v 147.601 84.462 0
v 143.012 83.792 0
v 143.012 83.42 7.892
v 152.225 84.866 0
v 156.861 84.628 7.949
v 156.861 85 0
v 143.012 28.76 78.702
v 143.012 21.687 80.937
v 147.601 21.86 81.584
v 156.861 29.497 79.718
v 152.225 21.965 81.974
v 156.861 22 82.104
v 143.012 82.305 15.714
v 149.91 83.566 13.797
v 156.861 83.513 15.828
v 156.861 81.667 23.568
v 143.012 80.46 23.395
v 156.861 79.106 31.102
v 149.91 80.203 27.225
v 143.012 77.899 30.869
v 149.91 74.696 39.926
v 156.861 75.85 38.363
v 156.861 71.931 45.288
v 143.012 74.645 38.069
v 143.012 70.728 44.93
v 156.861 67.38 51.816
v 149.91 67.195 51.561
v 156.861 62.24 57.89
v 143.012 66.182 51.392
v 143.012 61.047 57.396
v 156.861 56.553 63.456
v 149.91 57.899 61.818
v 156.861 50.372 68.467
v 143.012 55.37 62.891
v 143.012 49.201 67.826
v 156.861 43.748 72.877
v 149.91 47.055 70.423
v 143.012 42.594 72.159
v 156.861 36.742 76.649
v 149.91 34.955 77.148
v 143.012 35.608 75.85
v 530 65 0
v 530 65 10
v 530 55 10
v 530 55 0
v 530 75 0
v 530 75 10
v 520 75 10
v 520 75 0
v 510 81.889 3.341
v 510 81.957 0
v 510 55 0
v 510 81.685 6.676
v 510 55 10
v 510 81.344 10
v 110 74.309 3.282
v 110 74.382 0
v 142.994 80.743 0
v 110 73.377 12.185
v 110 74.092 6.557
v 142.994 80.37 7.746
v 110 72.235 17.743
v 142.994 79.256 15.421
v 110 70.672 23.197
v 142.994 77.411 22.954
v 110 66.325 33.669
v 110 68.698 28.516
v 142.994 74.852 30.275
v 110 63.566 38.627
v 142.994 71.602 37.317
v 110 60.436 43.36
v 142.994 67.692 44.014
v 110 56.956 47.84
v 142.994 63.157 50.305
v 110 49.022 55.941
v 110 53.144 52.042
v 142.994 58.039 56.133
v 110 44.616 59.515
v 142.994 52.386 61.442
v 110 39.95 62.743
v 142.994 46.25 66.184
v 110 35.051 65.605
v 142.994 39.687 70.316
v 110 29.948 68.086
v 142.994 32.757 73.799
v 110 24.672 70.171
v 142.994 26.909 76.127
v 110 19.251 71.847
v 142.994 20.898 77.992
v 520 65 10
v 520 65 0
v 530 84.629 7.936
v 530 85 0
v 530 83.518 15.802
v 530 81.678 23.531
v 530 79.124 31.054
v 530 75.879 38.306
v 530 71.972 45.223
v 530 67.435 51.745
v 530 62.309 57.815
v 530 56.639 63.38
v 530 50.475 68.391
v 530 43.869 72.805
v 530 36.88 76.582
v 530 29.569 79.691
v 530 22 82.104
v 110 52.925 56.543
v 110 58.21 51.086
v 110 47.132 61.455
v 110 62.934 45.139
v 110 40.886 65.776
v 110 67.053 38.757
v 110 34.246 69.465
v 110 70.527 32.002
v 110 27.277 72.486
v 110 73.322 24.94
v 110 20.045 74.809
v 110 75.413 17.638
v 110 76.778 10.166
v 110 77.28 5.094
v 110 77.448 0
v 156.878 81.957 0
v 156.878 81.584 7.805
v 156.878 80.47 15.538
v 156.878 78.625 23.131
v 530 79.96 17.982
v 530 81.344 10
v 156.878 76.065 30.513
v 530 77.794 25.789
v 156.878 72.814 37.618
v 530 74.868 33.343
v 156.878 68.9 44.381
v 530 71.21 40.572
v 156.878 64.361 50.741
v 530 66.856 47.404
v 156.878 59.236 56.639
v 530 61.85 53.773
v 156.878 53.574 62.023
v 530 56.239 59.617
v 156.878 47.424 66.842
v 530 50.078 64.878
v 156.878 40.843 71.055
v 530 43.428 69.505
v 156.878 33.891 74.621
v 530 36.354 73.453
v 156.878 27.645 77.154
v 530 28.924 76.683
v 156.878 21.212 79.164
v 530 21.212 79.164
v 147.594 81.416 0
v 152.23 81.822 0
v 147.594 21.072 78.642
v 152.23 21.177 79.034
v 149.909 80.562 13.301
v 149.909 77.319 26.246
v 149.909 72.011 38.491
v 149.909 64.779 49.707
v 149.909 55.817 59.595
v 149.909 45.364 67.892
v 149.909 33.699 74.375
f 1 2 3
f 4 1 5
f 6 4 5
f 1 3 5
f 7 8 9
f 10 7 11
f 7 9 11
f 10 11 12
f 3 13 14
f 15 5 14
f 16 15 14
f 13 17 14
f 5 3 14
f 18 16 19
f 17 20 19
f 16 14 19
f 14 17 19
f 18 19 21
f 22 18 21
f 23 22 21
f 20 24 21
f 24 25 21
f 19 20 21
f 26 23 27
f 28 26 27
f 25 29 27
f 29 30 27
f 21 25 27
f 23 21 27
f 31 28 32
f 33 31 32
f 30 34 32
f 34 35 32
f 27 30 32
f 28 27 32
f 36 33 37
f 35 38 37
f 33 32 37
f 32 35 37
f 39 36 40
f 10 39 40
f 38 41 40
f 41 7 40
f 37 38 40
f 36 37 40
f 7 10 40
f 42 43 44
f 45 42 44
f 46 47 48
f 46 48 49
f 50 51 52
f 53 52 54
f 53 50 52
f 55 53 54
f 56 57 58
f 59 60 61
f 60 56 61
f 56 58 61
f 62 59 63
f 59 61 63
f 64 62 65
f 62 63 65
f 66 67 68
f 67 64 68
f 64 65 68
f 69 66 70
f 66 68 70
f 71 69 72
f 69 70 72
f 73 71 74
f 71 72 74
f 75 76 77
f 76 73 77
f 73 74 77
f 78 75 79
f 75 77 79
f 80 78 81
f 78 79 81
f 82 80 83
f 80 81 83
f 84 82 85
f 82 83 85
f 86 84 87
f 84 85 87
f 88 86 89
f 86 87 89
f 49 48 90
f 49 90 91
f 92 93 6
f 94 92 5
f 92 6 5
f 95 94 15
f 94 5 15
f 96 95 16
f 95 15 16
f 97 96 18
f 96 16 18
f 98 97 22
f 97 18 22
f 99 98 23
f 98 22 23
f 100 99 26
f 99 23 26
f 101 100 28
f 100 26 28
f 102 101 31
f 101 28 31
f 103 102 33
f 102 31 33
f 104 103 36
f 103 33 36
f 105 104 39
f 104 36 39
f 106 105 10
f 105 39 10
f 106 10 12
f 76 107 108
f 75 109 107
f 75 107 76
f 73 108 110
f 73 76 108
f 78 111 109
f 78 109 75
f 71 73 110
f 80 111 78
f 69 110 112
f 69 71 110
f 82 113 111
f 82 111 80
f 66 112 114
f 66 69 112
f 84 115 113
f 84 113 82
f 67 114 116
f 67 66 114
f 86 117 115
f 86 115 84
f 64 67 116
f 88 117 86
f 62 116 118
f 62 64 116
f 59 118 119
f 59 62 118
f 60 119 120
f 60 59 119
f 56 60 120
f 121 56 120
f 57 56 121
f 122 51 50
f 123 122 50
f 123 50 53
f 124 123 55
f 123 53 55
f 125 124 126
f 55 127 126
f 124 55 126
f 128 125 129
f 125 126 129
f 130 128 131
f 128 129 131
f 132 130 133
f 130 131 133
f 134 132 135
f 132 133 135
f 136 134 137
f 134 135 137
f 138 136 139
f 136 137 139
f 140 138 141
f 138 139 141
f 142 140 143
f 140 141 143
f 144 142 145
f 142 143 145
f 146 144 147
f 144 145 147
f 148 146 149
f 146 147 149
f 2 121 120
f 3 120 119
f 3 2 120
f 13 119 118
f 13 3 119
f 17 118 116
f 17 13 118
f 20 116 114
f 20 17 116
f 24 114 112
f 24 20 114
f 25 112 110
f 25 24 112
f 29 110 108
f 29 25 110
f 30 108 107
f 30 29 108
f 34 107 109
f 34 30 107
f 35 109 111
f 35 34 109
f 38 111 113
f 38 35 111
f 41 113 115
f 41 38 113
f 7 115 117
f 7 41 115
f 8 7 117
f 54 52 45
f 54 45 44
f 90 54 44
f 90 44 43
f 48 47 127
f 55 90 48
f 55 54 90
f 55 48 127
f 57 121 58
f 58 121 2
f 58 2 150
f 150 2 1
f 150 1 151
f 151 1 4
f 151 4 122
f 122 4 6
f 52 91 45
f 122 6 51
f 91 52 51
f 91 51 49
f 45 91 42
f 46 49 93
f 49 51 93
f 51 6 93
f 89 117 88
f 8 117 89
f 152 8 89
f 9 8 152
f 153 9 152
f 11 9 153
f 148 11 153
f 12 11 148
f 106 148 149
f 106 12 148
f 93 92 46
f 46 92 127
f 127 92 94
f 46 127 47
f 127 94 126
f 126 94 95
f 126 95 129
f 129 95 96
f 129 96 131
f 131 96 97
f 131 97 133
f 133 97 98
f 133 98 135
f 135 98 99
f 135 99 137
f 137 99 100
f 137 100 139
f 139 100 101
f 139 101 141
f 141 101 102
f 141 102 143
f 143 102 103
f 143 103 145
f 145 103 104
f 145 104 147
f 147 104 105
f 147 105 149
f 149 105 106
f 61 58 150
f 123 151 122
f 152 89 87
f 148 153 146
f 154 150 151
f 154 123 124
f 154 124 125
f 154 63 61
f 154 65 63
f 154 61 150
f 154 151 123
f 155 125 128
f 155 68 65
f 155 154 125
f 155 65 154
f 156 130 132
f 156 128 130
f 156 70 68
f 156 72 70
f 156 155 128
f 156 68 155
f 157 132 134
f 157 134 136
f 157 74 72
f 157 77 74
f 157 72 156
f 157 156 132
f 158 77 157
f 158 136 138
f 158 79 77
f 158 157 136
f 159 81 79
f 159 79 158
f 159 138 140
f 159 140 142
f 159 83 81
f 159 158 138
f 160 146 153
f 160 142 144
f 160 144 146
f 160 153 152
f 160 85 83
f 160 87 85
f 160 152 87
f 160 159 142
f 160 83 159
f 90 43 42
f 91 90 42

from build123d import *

# Parameters (mm, degrees)
REVOLVE1_ANGLE      = 75
FILLET1_R           = 80
FILLET2_R           = 80
SKETCH3_W           = 220
SKETCH3_H           = 208.906104004
CUT_EXTRUDE3_DEPTH  = 159
BOSS_EXTRUDE1_START = -20
BOSS_EXTRUDE1_DEPTH = 20
SKETCH6_W           = 10
SKETCH6_H           = 10
CUT_EXTRUDE4_DEPTH  = 10


with BuildPart() as part:
    # Sketch1 → Revolve1 (revolve)
    with BuildSketch(Plane.XY):
        with BuildLine():
            Line((0, 0), (3.000014971, 0))
            Line((3.000014971, 0), (2.999985029, 0.009477573))
            add(Edge.make_bspline(
                [(2.999985029, 0.009477573), (2.993785153, 1.971956174), (2.98195041, 5.919056141), (3.145368661, 11.706950418), (3.673805689, 17.348455242), (4.826995442, 22.758009885), (6.767385374, 27.848912294), (10.462264152, 34.106073266), (16.932254921, 40.80886219), (26.377617743, 47.258644811), (36.67301066, 52.572311975), (47.441384771, 57.081049673), (62.17748954, 62.31037411), (81.042213455, 67.757539775), (104.018152235, 73.218909741), (126.982089983, 77.893970447), (142.347775171, 80.65244689), (149.958103424, 81.949720096), (150, 81.956859546)],
                knots=[0, 0, 0, 0, 0.03125, 0.0625, 0.09375, 0.125, 0.15625, 0.1875, 0.25, 0.3125, 0.375, 0.4375, 0.5, 0.625, 0.75, 0.875, 0.996633751, 0.997307001, 0.997307001, 0.997307001, 0.997307001], degree=3))
            Line((150, 81.956859546), (530, 81.956859546))
            Line((530, 81.956859546), (530, 85))
            Line((530, 85), (150, 85))
            add(Edge.make_bspline(
                [(0, 0), (-0.012294225, 3.891554312), (-0.027437579, 8.684958126), (0.361573767, 14.085722357), (0.576098453, 16.090496183), (0.782493435, 17.604822189), (0.986227589, 18.854298664), (1.188670863, 19.931536976), (1.390404268, 20.885679324), (1.591698837, 21.746529091), (1.792703864, 22.533746067), (1.993507167, 23.261083862), (2.253808552, 24.139979457), (2.580573656, 25.146175179), (2.983585386, 26.259501153), (3.385879093, 27.271261727), (3.787683439, 28.201566994), (4.189138614, 29.064817448), (4.590335615, 29.871726974), (5.05331092, 30.74778076), (5.583218589, 31.683457084), (6.185429632, 32.669732492), (6.787226927, 33.590624245), (7.451481511, 34.546094958), (8.182770444, 35.530963646), (8.985083876, 36.540013411), (9.850344603, 37.562485558), (10.782608842, 38.595746542), (11.785011743, 39.636928062), (12.851029789, 40.680352273), (13.983960321, 41.72463117), (15.186170623, 42.768194245), (16.387975322, 43.755294725), (17.654380903, 44.743506811), (18.987602276, 45.731471932), (20.389198856, 46.717890971), (21.790522044, 47.657861765), (23.257103599, 48.59836715), (24.790441056, 49.538186318), (26.391587757, 50.476245251), (28.05829275, 51.412163763), (29.791720393, 52.345056651), (31.59268286, 53.274185034), (33.459445798, 54.199628429), (35.392909821, 55.120726442), (37.459746918, 56.067201212), (39.59327023, 57.006562681), (41.860151348, 57.96659169), (44.193707143, 58.917521836), (46.660609333, 59.885320784), (49.260404933, 60.867669295), (51.99403381, 61.861671206), (54.860992187, 62.865616104), (57.794602823, 63.85555089), (60.861539281, 64.853573463), (64.06149587, 65.858380358), (67.461497598, 66.888166734), (70.995135905, 67.920234745), (74.662088876, 68.953918346), (78.462130407, 69.988575944), (82.462197069, 71.040436012), (86.662284614, 72.107100186), (91.062388571, 73.18640193), (95.662505252, 74.276388609), (100.462631288, 75.375305679), (105.462763855, 76.481579791), (110.662900527, 77.593803027), (116.063039296, 78.710717608), (121.663178505, 79.831201671), (127.529872228, 80.967142806), (133.663251007, 82.116215238), (140.063409966, 83.276352633), (145.198462089, 84.177415336), (148.333178957, 84.715838785), (149.39998937, 84.897876633), (149.733326587, 84.954653305), (149.933332963, 84.98866355), (150, 85)],
                knots=[0, 0, 0, 0, 0.061462209, 0.075705788, 0.085548437, 0.093321935, 0.099856333, 0.105553797, 0.110642995, 0.115267654, 0.119524592, 0.123482434, 0.127191759, 0.134010181, 0.140199136, 0.145901384, 0.151215493, 0.156212588, 0.160945789, 0.165455878, 0.171870938, 0.177937368, 0.183716425, 0.189254732, 0.196326298, 0.203099892, 0.209625632, 0.217492532, 0.225090541, 0.232464167, 0.24106462, 0.249438142, 0.257620809, 0.265641058, 0.274822876, 0.28384341, 0.292725747, 0.301488561, 0.311376345, 0.321146599, 0.330814589, 0.341584449, 0.352255608, 0.362840299, 0.374512001, 0.386101174, 0.398765505, 0.411352526, 0.425006218, 0.438588433, 0.453231339, 0.468927603, 0.484557057, 0.501237456, 0.517857889, 0.535527769, 0.554243231, 0.574001115, 0.593705628, 0.614453399, 0.636242373, 0.65907093, 0.682937829, 0.707842151, 0.733783254, 0.760760729, 0.78877436, 0.81782409, 0.847909993, 0.879032247, 0.912262482, 0.946527454, 0.981827786, 0.994656092, 0.99679374, 0.998931275, 1, 1, 1, 1], degree=3))
        make_face()
    revolve(axis=Axis((0, 0, 0), (1, 0, 0)), revolution_arc=REVOLVE1_ANGLE)

    # Fillet1
    fillet1_edges = [part.edges().sort_by_distance(p)[0] for p in [
        (150, 65.020748281, 49.892174934),
    ]]
    fillet(fillet1_edges, radius=FILLET1_R)

    # Fillet2
    fillet2_edges = [part.edges().sort_by_distance(p)[0] for p in [
        (150, 67.435033925, 51.744721466),
    ]]
    fillet(fillet2_edges, radius=FILLET2_R)

    # Sketch3 → Cut-Extrude3 (cut)
    with BuildSketch(Plane(origin=(0, 0, 0), x_dir=(1, 0, 0), z_dir=(0, 1, 0))):
        Rectangle(SKETCH3_W, SKETCH3_H)
    extrude(amount=CUT_EXTRUDE3_DEPTH, mode=Mode.SUBTRACT)

    # Sketch5 → Boss-Extrude1 (add)
    with BuildSketch(Plane(origin=(530, 0, 0), x_dir=(0, 0, -1), z_dir=(1, 0, 0)).offset(BOSS_EXTRUDE1_START)):
        with BuildLine():
            Line((0, 85), (0, 55))
            Line((0, 55), (-10, 55))
            Line((-10, 55), (-10, 84.409715081))
            ThreePointArc((-10, 84.409715081), (-5.008703332, 84.852300446), (0, 85))
        make_face()
    extrude(amount=BOSS_EXTRUDE1_DEPTH)

    # Sketch6 → Cut-Extrude4 (cut)
    with BuildSketch(Plane(origin=(530, 0, 0), x_dir=(0, 0, -1), z_dir=(1, 0, 0))):
        with Locations((-5, 70)):
            Rectangle(SKETCH6_W, SKETCH6_H)
    extrude(amount=-CUT_EXTRUDE4_DEPTH, mode=Mode.SUBTRACT)


solid = part.part
